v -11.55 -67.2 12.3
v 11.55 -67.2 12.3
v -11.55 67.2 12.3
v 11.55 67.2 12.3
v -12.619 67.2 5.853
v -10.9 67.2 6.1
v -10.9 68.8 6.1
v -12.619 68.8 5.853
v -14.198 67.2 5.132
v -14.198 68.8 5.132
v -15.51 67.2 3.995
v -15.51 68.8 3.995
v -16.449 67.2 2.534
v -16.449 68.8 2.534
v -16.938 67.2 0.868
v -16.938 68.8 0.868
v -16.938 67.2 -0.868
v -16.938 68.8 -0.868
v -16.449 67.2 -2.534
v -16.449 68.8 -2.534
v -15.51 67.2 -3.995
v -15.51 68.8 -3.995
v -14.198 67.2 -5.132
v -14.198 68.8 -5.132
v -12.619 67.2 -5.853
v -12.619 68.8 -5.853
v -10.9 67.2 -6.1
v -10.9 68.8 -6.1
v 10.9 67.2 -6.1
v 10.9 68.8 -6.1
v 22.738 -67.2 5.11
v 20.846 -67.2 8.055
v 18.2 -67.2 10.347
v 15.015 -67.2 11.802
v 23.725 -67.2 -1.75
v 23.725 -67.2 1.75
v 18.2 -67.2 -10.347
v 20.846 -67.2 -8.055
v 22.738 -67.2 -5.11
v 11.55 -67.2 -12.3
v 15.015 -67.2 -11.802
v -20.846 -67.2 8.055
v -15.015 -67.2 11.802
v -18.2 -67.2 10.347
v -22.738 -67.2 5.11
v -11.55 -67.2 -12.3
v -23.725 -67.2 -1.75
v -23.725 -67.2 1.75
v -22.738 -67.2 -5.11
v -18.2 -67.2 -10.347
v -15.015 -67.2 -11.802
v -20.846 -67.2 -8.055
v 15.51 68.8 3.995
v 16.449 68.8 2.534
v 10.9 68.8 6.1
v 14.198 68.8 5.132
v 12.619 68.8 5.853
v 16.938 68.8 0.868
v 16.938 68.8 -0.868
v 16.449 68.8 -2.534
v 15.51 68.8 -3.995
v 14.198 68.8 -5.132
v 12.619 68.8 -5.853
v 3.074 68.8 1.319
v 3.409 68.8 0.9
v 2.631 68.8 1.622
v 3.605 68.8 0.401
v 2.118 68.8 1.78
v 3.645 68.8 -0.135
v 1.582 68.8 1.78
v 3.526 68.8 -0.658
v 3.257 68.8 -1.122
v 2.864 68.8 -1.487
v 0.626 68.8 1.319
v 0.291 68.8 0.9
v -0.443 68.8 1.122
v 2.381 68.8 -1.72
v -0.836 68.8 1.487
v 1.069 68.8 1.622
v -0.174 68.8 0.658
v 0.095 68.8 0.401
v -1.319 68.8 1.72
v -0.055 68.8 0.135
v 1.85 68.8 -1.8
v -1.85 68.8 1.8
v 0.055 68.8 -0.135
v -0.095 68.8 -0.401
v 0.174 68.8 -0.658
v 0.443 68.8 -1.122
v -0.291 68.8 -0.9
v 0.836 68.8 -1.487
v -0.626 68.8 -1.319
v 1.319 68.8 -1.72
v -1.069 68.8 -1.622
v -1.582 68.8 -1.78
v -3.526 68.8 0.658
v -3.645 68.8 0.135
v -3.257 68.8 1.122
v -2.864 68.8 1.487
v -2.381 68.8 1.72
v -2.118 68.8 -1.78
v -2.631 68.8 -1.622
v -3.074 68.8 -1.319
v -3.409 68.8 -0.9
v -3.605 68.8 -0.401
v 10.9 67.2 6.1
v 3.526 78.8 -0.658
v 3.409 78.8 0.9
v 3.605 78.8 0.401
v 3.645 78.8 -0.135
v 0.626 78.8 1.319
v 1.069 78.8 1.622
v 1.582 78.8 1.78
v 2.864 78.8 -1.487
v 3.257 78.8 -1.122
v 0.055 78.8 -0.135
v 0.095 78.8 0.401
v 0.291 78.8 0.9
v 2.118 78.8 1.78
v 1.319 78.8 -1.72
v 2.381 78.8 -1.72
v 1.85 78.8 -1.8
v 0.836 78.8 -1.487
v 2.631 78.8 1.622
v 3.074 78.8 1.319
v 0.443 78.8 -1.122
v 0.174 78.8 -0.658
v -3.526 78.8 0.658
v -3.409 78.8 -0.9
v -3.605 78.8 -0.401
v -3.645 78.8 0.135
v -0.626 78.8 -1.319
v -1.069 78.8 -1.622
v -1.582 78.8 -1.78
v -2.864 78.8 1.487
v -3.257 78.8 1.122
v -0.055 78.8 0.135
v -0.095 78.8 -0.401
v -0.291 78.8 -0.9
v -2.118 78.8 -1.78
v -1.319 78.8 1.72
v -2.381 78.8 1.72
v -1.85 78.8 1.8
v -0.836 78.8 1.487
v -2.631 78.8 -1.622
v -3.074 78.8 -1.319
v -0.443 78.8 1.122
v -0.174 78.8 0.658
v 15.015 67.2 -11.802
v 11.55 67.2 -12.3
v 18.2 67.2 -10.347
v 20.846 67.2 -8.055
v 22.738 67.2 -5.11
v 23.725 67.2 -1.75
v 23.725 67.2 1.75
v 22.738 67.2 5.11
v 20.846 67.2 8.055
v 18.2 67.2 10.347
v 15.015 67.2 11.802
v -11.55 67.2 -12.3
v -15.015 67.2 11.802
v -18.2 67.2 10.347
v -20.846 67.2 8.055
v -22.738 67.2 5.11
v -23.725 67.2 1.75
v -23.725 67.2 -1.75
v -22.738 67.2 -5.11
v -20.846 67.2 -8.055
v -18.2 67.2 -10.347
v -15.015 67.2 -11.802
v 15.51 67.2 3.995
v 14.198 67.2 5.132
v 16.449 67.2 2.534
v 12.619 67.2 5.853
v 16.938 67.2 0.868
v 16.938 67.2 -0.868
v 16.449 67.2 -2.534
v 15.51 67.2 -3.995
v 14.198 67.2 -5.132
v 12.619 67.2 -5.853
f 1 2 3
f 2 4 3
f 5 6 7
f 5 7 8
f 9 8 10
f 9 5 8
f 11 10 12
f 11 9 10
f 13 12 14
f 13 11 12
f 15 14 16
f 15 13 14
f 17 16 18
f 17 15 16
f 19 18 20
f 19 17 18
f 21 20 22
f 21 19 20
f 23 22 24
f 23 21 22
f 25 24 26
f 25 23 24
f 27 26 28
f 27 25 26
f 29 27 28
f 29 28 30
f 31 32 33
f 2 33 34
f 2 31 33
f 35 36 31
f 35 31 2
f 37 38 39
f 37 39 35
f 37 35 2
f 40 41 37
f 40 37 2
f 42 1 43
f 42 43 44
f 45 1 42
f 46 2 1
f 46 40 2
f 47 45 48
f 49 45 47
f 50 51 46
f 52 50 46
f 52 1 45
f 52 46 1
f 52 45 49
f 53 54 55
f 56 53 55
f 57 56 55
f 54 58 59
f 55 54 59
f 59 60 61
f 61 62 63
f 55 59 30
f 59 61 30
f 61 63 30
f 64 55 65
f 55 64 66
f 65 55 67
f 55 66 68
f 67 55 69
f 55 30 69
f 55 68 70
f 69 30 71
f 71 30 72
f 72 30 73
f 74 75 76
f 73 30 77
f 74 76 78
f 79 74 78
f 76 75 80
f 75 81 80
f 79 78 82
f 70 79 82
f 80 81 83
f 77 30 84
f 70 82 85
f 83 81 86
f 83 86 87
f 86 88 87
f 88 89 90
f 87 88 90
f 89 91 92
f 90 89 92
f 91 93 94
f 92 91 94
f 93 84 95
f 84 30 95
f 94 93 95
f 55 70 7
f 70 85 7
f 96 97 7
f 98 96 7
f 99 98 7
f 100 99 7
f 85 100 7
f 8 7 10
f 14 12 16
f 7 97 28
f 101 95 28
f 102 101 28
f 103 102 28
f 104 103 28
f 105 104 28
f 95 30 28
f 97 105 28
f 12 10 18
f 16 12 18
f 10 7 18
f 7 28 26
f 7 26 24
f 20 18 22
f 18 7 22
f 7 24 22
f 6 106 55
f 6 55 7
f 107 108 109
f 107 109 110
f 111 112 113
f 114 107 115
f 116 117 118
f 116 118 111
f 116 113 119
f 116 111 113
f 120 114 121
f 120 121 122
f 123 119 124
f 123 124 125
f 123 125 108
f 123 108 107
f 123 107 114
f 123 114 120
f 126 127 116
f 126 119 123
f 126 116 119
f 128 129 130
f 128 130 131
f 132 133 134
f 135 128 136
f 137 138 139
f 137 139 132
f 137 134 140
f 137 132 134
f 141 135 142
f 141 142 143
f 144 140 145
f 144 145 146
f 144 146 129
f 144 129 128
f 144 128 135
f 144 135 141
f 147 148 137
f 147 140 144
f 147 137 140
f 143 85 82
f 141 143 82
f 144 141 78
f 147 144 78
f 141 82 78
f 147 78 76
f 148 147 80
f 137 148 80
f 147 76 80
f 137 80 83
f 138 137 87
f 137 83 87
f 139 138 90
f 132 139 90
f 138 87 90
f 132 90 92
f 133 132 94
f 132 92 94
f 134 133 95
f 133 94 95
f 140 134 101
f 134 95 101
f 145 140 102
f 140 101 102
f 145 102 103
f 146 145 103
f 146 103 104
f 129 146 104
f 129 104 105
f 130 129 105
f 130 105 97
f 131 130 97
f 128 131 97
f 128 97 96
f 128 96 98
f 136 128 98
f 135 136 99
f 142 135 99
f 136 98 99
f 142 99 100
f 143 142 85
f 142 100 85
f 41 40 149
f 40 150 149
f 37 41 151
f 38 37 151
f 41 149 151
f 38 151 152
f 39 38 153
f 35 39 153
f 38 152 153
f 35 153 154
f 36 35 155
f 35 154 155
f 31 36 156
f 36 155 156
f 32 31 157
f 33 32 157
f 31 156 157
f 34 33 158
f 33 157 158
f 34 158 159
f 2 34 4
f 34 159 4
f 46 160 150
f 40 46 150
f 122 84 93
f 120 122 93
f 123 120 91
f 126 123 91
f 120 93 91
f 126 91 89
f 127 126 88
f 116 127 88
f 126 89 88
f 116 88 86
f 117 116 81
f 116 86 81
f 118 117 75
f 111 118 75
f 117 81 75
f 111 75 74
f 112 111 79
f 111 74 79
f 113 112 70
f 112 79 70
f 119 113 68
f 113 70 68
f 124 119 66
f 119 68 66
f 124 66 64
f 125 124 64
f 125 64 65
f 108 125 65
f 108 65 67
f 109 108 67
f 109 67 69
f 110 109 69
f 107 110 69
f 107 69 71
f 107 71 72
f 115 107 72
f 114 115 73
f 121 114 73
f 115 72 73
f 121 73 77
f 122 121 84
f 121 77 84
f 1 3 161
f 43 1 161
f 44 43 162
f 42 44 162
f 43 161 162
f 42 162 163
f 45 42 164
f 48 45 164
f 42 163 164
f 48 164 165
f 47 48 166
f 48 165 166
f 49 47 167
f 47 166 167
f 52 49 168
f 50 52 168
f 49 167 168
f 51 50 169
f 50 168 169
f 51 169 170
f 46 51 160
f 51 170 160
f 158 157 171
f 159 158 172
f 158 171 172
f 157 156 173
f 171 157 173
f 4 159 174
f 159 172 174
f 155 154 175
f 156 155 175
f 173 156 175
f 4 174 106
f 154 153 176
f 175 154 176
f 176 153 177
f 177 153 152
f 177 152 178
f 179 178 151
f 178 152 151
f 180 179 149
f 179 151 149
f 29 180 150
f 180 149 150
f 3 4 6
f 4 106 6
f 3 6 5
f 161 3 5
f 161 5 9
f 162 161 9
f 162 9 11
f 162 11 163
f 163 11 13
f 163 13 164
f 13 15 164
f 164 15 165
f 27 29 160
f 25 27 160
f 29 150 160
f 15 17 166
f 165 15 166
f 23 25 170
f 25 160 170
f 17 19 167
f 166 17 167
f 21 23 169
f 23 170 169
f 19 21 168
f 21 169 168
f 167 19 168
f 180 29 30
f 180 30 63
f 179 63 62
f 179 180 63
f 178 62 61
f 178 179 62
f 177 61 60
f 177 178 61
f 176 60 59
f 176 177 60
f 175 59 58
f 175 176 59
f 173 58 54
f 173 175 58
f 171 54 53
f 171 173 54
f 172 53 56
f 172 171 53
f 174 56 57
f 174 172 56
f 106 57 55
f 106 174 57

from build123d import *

# Parameters (mm, degrees)
BOSS_EXTRU_1_DEPTH = 67.2
BOSS_EXTRU_2_DEPTH = 1.6
ESQUISSE3_R        = 1.8
BOSS_EXTRU_3_DEPTH = 10


with BuildPart() as part:
    # Esquisse1 → Boss.-Extru.1 (new, symmetric)
    with BuildSketch(Plane(origin=(0, 0, 0), x_dir=(1, 0, 0), z_dir=(0, 1, 0))):
        with BuildLine():
            Line((-11.55, 12.3), (11.55, 12.3))
            ThreePointArc((11.55, 12.3), (23.85, 0), (11.55, -12.3))
            Line((11.55, -12.3), (-11.55, -12.3))
            ThreePointArc((-11.55, -12.3), (-23.85, 0), (-11.55, 12.3))
        make_face()
    extrude(amount=BOSS_EXTRU_1_DEPTH, both=True)

    # Esquisse2 → Boss.-Extru.2 (add)
    with BuildSketch(Plane(origin=(0, 67.2, 0), x_dir=(1, 0, 0), z_dir=(0, 1, 0))):
        with BuildLine():
            Line((-10.9, 6.1), (10.9, 6.1))
            ThreePointArc((10.9, 6.1), (17, 0), (10.9, -6.1))
            Line((10.9, -6.1), (-10.9, -6.1))
            ThreePointArc((-10.9, -6.1), (-17, 0), (-10.9, 6.1))
        make_face()
    extrude(amount=BOSS_EXTRU_2_DEPTH)

    # Esquisse3 → Boss.-Extru.3 (add)
    with BuildSketch(Plane(origin=(0, 68.8, 0), x_dir=(1, 0, 0), z_dir=(0, 1, 0))):
        with Locations(Location((-1.85, 0, 0), (0, 0, 270))):
            Circle(ESQUISSE3_R)
        with Locations(Location((1.85, 0, 0), (0, 0, 90))):
            Circle(ESQUISSE3_R)
    extrude(amount=BOSS_EXTRU_3_DEPTH)


solid = part.part
